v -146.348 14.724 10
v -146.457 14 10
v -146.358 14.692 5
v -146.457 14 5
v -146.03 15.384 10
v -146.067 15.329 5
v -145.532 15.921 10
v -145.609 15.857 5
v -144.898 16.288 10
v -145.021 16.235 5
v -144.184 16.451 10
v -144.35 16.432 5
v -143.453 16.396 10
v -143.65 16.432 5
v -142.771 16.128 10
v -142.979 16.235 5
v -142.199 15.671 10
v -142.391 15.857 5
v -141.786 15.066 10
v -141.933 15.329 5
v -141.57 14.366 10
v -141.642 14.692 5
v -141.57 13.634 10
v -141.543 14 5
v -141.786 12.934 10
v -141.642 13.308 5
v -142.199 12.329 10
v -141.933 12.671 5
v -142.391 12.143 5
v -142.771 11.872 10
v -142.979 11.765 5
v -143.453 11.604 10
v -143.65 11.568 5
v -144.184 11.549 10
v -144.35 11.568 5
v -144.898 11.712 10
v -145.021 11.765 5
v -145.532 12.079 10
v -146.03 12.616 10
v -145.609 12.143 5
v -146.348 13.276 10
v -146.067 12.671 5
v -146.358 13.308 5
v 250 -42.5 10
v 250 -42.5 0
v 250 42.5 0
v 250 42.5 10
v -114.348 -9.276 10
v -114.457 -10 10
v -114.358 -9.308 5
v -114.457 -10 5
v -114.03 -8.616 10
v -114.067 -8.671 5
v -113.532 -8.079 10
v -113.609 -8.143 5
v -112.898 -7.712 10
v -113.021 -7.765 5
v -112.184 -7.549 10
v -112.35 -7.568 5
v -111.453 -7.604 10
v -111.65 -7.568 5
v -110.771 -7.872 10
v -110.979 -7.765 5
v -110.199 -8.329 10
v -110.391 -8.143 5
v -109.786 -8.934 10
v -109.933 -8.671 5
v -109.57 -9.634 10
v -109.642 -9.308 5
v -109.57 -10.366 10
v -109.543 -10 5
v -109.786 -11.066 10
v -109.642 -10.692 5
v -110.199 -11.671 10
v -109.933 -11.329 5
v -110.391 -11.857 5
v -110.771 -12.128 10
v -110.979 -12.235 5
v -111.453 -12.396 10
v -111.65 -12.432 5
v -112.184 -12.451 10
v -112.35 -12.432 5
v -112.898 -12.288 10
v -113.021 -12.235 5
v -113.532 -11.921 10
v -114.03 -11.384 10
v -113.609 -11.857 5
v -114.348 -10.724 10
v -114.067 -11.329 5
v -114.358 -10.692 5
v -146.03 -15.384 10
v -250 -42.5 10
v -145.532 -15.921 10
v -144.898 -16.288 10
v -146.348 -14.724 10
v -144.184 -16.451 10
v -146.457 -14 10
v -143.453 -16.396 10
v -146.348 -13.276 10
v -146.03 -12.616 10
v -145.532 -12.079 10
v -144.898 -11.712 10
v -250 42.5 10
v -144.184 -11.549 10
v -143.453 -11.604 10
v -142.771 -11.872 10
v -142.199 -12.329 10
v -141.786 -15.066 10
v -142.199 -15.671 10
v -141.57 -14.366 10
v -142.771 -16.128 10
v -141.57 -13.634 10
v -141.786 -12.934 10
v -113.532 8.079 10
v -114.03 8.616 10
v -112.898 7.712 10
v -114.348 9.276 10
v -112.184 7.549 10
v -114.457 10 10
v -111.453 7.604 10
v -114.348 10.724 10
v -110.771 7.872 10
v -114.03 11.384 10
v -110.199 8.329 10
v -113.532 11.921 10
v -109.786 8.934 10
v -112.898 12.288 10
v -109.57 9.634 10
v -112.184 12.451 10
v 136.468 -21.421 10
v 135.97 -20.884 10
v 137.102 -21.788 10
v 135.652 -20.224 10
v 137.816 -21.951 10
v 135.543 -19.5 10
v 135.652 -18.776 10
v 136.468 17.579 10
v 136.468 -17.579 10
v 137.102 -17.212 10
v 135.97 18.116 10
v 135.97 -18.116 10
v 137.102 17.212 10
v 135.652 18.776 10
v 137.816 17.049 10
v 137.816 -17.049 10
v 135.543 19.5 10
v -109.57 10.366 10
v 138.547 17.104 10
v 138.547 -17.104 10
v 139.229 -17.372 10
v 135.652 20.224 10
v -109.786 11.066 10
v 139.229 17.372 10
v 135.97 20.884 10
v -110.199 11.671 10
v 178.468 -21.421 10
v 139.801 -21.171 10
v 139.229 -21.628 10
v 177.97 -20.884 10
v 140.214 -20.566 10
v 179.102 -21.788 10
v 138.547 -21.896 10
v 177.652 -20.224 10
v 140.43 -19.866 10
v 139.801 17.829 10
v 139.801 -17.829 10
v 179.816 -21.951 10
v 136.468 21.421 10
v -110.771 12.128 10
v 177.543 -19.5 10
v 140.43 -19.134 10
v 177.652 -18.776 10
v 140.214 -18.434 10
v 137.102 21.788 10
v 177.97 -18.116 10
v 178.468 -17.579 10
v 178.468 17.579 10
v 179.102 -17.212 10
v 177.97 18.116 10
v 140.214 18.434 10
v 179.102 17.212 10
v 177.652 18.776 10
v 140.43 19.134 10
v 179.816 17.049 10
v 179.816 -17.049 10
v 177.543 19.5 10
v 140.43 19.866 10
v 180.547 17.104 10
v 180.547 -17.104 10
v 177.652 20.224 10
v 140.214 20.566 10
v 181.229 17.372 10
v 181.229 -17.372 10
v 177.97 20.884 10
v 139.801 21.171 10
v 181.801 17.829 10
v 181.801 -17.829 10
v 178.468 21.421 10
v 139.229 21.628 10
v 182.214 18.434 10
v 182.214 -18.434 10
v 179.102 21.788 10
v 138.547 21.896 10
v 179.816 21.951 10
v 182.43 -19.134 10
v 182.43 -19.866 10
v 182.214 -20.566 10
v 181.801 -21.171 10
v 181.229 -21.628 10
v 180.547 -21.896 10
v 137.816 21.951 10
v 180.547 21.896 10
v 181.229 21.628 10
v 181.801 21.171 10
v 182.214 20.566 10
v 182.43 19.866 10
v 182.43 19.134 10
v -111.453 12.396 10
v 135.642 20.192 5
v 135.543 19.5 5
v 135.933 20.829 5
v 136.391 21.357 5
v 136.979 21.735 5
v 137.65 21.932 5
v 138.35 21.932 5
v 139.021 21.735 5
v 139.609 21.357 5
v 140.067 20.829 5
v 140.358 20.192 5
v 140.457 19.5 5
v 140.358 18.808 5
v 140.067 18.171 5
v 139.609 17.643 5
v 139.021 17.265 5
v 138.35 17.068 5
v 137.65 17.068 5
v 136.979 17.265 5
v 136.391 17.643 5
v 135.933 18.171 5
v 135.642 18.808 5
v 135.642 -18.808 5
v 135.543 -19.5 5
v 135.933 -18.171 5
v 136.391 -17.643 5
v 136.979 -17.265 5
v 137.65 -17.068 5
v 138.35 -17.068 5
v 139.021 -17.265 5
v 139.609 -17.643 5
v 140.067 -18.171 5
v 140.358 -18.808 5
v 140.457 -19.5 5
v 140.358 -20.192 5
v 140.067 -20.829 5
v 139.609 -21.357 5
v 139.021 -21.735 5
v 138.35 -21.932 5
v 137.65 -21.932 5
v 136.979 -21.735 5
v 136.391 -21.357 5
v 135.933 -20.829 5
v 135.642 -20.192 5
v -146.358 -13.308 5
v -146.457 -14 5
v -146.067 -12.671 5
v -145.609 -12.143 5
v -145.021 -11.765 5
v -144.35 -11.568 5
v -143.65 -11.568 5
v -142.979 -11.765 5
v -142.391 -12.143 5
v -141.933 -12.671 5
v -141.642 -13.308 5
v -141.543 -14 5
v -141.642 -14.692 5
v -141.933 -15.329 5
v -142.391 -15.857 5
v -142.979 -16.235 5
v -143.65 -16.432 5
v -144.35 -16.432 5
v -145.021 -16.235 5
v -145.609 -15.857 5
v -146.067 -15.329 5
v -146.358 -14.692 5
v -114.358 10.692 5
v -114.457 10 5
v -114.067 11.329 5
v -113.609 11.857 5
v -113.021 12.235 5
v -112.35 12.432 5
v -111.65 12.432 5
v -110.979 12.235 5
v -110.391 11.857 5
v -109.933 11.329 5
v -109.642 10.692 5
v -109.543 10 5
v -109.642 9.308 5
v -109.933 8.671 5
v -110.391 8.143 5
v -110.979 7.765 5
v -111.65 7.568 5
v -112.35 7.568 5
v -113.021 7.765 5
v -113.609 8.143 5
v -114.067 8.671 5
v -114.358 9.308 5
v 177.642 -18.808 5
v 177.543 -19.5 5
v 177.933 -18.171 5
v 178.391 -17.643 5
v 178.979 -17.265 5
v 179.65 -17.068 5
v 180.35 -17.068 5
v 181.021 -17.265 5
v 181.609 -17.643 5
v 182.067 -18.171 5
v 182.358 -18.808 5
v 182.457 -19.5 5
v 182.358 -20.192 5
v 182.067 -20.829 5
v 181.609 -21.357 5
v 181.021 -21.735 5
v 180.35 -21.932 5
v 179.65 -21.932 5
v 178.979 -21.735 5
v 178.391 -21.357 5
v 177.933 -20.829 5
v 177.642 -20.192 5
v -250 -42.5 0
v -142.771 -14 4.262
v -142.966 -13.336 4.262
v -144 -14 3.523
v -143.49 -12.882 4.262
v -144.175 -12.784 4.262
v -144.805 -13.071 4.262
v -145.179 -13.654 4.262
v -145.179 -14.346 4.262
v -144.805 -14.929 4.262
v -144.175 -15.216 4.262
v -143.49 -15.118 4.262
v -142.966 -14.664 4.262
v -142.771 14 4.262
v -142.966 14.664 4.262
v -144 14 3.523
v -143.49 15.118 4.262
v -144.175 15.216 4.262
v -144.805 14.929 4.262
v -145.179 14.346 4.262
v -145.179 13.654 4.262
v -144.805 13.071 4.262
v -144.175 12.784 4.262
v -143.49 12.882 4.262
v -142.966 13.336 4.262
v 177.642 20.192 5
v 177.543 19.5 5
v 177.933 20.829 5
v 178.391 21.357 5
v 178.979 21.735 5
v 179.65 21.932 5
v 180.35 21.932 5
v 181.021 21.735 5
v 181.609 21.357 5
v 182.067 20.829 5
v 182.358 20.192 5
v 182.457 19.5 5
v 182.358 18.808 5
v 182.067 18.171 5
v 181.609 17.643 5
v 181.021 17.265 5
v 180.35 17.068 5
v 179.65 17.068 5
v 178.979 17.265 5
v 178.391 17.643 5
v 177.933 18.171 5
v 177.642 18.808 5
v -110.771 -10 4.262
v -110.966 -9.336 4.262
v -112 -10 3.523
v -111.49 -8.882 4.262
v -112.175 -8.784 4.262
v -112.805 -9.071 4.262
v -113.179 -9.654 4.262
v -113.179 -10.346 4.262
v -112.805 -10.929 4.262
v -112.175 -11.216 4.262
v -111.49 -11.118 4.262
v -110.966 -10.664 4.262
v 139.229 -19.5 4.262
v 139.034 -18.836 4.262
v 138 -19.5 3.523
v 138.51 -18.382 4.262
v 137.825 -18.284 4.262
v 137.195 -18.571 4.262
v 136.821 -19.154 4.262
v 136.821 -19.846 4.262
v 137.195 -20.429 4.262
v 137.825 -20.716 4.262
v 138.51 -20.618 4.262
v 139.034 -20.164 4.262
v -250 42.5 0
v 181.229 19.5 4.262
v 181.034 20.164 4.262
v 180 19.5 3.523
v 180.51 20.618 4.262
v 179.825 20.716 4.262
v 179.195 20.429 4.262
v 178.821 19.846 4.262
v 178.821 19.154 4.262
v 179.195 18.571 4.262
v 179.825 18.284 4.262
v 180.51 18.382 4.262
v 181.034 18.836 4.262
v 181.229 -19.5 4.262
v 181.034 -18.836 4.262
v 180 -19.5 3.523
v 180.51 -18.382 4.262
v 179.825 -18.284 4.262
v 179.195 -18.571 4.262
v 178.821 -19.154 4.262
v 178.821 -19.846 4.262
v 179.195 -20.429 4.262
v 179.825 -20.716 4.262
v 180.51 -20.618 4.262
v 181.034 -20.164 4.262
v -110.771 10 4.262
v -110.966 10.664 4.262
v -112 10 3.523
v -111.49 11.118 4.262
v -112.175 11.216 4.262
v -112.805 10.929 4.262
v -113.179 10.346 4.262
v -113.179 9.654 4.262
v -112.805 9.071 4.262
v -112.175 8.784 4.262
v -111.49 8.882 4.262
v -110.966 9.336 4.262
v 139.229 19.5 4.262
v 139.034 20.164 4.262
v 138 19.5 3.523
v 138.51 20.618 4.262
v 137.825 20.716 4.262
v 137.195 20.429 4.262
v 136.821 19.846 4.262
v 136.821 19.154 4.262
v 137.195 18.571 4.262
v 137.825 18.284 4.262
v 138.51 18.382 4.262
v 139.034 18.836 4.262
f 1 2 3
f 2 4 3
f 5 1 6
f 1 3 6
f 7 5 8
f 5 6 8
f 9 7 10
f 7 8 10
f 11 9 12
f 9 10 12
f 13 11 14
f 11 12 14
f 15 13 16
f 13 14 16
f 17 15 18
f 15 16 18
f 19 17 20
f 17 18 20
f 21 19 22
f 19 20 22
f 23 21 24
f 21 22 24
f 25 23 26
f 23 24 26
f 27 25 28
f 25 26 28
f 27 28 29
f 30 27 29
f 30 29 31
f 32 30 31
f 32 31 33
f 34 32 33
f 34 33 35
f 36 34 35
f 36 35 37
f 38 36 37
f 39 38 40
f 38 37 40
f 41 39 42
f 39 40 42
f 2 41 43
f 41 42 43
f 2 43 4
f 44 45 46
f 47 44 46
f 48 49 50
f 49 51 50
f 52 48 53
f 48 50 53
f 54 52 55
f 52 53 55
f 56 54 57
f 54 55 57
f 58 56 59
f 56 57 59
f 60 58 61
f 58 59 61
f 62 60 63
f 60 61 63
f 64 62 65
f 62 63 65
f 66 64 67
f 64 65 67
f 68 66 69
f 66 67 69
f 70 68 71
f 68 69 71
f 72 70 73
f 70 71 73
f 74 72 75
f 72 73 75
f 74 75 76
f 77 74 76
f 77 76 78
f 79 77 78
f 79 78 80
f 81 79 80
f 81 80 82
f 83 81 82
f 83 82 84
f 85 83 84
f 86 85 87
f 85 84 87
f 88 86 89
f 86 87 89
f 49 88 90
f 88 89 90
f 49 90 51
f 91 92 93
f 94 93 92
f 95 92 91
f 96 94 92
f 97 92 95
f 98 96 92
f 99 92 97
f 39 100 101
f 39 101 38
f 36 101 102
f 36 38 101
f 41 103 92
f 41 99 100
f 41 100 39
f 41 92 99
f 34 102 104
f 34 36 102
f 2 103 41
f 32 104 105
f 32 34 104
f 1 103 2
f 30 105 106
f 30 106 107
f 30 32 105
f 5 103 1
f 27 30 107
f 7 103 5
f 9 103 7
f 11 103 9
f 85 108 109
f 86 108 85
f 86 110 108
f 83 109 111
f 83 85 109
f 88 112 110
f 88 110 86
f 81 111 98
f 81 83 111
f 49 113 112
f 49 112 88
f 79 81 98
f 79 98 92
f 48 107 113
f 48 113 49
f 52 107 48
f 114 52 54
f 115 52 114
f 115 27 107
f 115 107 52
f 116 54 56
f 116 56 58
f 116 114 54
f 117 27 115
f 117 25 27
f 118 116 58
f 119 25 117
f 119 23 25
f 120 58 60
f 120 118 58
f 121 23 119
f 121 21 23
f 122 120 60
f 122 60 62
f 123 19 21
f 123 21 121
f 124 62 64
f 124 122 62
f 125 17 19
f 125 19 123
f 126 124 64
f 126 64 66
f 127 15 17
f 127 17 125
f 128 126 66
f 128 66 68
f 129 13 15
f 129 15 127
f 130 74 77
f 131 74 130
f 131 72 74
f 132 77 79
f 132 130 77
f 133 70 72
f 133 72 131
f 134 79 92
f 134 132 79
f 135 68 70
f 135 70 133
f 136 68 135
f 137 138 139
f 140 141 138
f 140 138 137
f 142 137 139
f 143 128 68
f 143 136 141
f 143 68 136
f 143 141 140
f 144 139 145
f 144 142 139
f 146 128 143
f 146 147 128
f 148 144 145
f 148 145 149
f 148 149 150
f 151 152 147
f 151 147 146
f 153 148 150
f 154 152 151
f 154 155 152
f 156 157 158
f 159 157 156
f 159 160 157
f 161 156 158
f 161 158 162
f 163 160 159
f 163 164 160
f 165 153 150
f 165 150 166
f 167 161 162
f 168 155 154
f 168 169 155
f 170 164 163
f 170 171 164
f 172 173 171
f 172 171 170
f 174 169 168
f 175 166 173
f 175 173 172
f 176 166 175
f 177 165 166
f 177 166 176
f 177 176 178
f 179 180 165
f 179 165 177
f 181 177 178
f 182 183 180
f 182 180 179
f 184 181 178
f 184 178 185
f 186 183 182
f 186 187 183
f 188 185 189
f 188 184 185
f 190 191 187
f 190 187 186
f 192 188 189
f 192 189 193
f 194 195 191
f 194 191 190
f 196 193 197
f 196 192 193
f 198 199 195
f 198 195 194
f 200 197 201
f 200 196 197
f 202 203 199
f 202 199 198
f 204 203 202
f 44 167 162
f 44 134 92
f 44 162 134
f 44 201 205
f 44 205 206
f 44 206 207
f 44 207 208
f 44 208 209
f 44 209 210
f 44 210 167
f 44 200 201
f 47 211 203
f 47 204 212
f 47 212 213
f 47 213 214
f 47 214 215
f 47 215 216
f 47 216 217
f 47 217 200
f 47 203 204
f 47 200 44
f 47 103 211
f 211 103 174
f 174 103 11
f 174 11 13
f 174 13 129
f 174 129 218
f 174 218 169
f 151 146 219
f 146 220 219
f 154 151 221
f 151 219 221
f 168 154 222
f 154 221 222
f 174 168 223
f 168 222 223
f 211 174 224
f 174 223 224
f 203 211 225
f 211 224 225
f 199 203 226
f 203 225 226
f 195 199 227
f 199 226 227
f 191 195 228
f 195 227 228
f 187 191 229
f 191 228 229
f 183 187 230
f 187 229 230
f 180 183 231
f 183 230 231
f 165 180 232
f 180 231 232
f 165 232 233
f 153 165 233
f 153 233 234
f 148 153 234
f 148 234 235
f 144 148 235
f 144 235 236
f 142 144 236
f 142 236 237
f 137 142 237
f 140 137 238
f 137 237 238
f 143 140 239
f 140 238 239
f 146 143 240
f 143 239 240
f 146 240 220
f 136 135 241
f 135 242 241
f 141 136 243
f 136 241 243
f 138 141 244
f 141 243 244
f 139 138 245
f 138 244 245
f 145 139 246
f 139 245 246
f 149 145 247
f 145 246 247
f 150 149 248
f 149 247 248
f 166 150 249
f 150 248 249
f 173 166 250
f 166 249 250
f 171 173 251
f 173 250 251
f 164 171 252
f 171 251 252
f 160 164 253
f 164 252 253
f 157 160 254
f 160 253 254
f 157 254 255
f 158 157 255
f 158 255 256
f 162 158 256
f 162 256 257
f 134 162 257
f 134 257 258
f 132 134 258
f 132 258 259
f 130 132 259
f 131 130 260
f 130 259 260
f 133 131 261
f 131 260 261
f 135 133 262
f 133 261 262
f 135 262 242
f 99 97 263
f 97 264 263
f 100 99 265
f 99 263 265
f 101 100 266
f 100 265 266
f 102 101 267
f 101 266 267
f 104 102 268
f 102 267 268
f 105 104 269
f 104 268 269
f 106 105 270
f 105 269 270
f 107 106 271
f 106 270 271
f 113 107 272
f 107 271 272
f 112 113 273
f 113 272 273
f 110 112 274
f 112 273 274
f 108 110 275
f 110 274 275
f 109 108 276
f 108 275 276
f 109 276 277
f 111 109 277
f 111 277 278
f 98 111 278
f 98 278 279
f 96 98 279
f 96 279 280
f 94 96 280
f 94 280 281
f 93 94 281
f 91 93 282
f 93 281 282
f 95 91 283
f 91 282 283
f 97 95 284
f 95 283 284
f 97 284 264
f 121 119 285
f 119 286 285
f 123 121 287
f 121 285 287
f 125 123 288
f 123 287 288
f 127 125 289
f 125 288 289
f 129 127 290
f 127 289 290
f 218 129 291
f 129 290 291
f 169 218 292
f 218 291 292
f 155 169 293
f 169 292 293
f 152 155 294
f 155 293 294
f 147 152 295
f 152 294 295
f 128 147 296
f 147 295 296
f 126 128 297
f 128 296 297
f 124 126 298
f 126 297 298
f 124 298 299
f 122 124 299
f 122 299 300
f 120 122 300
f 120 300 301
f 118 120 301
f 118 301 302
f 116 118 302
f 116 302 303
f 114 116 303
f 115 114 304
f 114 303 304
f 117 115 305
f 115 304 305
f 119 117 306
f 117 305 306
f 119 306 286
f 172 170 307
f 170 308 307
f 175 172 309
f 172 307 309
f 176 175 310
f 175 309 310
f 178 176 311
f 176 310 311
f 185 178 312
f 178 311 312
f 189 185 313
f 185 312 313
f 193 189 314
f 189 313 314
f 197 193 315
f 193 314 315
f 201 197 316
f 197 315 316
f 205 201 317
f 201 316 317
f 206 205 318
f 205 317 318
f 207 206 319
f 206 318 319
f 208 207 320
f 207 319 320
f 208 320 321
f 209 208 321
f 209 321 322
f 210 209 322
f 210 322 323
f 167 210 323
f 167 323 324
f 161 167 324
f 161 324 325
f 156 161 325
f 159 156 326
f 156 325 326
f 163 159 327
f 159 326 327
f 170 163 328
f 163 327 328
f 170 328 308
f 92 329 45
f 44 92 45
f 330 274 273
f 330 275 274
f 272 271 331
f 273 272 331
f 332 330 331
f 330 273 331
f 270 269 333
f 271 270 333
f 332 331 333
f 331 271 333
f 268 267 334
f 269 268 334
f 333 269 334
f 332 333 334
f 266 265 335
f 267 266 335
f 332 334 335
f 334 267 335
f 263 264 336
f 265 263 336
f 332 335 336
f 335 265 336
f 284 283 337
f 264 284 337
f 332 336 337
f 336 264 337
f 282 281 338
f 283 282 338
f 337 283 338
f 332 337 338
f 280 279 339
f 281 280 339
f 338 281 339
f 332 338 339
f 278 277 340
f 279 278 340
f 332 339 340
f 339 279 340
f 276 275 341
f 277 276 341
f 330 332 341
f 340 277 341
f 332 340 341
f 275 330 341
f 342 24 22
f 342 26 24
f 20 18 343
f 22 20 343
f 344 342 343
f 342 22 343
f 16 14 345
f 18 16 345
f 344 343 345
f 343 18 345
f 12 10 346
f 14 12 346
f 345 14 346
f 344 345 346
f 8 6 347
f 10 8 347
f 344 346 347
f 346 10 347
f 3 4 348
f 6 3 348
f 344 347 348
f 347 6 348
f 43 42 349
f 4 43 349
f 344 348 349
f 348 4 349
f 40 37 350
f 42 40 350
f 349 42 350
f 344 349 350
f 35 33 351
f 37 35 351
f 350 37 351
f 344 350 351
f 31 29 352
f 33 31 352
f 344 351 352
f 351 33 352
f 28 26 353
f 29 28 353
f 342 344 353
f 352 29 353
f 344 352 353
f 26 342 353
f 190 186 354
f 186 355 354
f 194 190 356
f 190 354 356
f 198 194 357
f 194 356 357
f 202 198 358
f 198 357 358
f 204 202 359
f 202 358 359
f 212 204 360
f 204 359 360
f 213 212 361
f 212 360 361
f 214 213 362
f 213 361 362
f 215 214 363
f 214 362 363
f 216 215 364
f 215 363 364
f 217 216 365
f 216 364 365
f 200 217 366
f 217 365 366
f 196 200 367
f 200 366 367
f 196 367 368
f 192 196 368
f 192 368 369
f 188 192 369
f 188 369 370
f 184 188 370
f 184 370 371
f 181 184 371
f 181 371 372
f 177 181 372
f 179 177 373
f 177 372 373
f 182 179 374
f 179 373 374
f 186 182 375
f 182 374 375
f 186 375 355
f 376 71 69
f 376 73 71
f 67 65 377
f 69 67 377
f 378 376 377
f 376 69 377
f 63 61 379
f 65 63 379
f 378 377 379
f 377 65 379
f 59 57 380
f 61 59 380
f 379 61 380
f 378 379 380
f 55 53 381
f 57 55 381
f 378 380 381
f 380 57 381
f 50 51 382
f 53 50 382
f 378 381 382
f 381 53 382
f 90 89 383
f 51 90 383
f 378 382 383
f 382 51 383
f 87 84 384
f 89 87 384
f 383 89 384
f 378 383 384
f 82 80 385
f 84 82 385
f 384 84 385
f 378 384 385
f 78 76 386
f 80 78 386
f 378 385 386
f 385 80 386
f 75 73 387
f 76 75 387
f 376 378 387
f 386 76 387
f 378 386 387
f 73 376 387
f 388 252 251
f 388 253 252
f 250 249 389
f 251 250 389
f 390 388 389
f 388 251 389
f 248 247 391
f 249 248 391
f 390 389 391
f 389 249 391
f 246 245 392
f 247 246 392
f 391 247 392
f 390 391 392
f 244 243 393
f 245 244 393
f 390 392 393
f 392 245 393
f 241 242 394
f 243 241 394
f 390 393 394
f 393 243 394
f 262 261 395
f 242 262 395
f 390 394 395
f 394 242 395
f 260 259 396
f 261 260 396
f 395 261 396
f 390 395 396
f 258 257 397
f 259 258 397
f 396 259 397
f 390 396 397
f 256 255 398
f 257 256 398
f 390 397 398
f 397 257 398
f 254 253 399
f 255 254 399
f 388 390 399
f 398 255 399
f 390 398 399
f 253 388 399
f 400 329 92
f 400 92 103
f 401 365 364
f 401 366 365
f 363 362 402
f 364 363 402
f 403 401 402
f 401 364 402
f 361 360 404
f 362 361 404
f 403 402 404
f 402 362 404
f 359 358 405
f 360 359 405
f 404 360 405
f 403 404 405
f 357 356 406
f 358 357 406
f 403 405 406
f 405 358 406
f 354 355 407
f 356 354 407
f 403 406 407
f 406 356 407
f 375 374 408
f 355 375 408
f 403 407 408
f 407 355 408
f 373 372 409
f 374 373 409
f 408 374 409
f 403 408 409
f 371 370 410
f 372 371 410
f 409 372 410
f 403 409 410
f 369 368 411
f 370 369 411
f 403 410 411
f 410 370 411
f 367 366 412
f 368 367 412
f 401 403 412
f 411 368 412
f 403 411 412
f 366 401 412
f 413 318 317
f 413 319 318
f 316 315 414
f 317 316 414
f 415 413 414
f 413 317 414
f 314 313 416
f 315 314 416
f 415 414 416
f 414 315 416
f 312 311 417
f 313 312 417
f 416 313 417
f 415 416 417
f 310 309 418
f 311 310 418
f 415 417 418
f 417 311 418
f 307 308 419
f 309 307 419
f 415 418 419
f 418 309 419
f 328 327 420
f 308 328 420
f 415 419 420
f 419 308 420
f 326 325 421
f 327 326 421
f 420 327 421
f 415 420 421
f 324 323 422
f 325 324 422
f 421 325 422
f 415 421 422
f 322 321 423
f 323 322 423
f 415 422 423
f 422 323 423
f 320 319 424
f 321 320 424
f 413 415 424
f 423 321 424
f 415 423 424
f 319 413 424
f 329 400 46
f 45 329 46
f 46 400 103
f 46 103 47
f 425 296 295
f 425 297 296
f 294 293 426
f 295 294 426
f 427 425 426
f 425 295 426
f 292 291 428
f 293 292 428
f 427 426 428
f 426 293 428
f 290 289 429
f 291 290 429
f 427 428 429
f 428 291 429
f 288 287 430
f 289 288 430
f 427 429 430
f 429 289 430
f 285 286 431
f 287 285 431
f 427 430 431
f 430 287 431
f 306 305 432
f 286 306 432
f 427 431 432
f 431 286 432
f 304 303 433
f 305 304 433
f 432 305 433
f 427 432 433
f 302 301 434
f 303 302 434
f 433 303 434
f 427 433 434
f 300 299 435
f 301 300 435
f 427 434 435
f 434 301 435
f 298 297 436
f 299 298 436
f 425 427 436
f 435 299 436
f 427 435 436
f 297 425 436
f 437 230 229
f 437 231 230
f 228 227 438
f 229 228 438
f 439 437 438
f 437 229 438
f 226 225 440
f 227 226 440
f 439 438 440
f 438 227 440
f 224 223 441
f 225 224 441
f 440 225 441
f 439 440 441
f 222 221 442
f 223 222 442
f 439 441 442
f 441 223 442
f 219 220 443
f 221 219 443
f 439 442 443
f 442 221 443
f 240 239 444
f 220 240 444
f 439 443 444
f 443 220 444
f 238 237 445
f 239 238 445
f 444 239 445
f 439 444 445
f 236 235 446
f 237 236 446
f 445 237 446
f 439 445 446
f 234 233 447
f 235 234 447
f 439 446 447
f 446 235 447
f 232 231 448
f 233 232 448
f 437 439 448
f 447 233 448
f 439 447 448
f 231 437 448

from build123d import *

# Parameters (mm, degrees)
SKETCH1_W                        = 500
SKETCH1_H                        = 85
BOSS_EXTRUDE1_DEPTH              = 10
F_10_0_1935_DIAMETER_HOLE1_D     = 4.9149
F_10_0_1935_DIAMETER_HOLE1_DEPTH = 5
F_10_0_1935_DIAMETER_HOLE1_TIP   = 1.476584928
F_10_0_1935_DIAMETER_HOLE2_D     = 4.9149
F_10_0_1935_DIAMETER_HOLE2_DEPTH = 5
F_10_0_1935_DIAMETER_HOLE2_TIP   = 1.476584928


with BuildPart() as part:
    # Sketch1 → Boss-Extrude1 (new body)
    with BuildSketch(Plane.XY):
        Rectangle(SKETCH1_W, SKETCH1_H)
    extrude(amount=BOSS_EXTRUDE1_DEPTH)

    # #10 (0.1935) Diameter Hole1
    with Locations(Plane.XY.offset(10)):
        with Locations((180, 19.5), (180, -19.5), (138, -19.5), (138, 19.5)):
            Hole(F_10_0_1935_DIAMETER_HOLE1_D / 2, depth=F_10_0_1935_DIAMETER_HOLE1_DEPTH)
            with Locations((0, 0, -(F_10_0_1935_DIAMETER_HOLE1_DEPTH + F_10_0_1935_DIAMETER_HOLE1_TIP / 2))):  # 118° drill point
                Cone(0, F_10_0_1935_DIAMETER_HOLE1_D / 2, F_10_0_1935_DIAMETER_HOLE1_TIP, mode=Mode.SUBTRACT)

    # #10 (0.1935) Diameter Hole2
    with Locations(Plane.XY.offset(10)):
        with Locations((-144, 14), (-112, 10), (-112, -10), (-144, -14)):
            Hole(F_10_0_1935_DIAMETER_HOLE2_D / 2, depth=F_10_0_1935_DIAMETER_HOLE2_DEPTH)
            with Locations((0, 0, -(F_10_0_1935_DIAMETER_HOLE2_DEPTH + F_10_0_1935_DIAMETER_HOLE2_TIP / 2))):  # 118° drill point
                Cone(0, F_10_0_1935_DIAMETER_HOLE2_D / 2, F_10_0_1935_DIAMETER_HOLE2_TIP, mode=Mode.SUBTRACT)


solid = part.part
